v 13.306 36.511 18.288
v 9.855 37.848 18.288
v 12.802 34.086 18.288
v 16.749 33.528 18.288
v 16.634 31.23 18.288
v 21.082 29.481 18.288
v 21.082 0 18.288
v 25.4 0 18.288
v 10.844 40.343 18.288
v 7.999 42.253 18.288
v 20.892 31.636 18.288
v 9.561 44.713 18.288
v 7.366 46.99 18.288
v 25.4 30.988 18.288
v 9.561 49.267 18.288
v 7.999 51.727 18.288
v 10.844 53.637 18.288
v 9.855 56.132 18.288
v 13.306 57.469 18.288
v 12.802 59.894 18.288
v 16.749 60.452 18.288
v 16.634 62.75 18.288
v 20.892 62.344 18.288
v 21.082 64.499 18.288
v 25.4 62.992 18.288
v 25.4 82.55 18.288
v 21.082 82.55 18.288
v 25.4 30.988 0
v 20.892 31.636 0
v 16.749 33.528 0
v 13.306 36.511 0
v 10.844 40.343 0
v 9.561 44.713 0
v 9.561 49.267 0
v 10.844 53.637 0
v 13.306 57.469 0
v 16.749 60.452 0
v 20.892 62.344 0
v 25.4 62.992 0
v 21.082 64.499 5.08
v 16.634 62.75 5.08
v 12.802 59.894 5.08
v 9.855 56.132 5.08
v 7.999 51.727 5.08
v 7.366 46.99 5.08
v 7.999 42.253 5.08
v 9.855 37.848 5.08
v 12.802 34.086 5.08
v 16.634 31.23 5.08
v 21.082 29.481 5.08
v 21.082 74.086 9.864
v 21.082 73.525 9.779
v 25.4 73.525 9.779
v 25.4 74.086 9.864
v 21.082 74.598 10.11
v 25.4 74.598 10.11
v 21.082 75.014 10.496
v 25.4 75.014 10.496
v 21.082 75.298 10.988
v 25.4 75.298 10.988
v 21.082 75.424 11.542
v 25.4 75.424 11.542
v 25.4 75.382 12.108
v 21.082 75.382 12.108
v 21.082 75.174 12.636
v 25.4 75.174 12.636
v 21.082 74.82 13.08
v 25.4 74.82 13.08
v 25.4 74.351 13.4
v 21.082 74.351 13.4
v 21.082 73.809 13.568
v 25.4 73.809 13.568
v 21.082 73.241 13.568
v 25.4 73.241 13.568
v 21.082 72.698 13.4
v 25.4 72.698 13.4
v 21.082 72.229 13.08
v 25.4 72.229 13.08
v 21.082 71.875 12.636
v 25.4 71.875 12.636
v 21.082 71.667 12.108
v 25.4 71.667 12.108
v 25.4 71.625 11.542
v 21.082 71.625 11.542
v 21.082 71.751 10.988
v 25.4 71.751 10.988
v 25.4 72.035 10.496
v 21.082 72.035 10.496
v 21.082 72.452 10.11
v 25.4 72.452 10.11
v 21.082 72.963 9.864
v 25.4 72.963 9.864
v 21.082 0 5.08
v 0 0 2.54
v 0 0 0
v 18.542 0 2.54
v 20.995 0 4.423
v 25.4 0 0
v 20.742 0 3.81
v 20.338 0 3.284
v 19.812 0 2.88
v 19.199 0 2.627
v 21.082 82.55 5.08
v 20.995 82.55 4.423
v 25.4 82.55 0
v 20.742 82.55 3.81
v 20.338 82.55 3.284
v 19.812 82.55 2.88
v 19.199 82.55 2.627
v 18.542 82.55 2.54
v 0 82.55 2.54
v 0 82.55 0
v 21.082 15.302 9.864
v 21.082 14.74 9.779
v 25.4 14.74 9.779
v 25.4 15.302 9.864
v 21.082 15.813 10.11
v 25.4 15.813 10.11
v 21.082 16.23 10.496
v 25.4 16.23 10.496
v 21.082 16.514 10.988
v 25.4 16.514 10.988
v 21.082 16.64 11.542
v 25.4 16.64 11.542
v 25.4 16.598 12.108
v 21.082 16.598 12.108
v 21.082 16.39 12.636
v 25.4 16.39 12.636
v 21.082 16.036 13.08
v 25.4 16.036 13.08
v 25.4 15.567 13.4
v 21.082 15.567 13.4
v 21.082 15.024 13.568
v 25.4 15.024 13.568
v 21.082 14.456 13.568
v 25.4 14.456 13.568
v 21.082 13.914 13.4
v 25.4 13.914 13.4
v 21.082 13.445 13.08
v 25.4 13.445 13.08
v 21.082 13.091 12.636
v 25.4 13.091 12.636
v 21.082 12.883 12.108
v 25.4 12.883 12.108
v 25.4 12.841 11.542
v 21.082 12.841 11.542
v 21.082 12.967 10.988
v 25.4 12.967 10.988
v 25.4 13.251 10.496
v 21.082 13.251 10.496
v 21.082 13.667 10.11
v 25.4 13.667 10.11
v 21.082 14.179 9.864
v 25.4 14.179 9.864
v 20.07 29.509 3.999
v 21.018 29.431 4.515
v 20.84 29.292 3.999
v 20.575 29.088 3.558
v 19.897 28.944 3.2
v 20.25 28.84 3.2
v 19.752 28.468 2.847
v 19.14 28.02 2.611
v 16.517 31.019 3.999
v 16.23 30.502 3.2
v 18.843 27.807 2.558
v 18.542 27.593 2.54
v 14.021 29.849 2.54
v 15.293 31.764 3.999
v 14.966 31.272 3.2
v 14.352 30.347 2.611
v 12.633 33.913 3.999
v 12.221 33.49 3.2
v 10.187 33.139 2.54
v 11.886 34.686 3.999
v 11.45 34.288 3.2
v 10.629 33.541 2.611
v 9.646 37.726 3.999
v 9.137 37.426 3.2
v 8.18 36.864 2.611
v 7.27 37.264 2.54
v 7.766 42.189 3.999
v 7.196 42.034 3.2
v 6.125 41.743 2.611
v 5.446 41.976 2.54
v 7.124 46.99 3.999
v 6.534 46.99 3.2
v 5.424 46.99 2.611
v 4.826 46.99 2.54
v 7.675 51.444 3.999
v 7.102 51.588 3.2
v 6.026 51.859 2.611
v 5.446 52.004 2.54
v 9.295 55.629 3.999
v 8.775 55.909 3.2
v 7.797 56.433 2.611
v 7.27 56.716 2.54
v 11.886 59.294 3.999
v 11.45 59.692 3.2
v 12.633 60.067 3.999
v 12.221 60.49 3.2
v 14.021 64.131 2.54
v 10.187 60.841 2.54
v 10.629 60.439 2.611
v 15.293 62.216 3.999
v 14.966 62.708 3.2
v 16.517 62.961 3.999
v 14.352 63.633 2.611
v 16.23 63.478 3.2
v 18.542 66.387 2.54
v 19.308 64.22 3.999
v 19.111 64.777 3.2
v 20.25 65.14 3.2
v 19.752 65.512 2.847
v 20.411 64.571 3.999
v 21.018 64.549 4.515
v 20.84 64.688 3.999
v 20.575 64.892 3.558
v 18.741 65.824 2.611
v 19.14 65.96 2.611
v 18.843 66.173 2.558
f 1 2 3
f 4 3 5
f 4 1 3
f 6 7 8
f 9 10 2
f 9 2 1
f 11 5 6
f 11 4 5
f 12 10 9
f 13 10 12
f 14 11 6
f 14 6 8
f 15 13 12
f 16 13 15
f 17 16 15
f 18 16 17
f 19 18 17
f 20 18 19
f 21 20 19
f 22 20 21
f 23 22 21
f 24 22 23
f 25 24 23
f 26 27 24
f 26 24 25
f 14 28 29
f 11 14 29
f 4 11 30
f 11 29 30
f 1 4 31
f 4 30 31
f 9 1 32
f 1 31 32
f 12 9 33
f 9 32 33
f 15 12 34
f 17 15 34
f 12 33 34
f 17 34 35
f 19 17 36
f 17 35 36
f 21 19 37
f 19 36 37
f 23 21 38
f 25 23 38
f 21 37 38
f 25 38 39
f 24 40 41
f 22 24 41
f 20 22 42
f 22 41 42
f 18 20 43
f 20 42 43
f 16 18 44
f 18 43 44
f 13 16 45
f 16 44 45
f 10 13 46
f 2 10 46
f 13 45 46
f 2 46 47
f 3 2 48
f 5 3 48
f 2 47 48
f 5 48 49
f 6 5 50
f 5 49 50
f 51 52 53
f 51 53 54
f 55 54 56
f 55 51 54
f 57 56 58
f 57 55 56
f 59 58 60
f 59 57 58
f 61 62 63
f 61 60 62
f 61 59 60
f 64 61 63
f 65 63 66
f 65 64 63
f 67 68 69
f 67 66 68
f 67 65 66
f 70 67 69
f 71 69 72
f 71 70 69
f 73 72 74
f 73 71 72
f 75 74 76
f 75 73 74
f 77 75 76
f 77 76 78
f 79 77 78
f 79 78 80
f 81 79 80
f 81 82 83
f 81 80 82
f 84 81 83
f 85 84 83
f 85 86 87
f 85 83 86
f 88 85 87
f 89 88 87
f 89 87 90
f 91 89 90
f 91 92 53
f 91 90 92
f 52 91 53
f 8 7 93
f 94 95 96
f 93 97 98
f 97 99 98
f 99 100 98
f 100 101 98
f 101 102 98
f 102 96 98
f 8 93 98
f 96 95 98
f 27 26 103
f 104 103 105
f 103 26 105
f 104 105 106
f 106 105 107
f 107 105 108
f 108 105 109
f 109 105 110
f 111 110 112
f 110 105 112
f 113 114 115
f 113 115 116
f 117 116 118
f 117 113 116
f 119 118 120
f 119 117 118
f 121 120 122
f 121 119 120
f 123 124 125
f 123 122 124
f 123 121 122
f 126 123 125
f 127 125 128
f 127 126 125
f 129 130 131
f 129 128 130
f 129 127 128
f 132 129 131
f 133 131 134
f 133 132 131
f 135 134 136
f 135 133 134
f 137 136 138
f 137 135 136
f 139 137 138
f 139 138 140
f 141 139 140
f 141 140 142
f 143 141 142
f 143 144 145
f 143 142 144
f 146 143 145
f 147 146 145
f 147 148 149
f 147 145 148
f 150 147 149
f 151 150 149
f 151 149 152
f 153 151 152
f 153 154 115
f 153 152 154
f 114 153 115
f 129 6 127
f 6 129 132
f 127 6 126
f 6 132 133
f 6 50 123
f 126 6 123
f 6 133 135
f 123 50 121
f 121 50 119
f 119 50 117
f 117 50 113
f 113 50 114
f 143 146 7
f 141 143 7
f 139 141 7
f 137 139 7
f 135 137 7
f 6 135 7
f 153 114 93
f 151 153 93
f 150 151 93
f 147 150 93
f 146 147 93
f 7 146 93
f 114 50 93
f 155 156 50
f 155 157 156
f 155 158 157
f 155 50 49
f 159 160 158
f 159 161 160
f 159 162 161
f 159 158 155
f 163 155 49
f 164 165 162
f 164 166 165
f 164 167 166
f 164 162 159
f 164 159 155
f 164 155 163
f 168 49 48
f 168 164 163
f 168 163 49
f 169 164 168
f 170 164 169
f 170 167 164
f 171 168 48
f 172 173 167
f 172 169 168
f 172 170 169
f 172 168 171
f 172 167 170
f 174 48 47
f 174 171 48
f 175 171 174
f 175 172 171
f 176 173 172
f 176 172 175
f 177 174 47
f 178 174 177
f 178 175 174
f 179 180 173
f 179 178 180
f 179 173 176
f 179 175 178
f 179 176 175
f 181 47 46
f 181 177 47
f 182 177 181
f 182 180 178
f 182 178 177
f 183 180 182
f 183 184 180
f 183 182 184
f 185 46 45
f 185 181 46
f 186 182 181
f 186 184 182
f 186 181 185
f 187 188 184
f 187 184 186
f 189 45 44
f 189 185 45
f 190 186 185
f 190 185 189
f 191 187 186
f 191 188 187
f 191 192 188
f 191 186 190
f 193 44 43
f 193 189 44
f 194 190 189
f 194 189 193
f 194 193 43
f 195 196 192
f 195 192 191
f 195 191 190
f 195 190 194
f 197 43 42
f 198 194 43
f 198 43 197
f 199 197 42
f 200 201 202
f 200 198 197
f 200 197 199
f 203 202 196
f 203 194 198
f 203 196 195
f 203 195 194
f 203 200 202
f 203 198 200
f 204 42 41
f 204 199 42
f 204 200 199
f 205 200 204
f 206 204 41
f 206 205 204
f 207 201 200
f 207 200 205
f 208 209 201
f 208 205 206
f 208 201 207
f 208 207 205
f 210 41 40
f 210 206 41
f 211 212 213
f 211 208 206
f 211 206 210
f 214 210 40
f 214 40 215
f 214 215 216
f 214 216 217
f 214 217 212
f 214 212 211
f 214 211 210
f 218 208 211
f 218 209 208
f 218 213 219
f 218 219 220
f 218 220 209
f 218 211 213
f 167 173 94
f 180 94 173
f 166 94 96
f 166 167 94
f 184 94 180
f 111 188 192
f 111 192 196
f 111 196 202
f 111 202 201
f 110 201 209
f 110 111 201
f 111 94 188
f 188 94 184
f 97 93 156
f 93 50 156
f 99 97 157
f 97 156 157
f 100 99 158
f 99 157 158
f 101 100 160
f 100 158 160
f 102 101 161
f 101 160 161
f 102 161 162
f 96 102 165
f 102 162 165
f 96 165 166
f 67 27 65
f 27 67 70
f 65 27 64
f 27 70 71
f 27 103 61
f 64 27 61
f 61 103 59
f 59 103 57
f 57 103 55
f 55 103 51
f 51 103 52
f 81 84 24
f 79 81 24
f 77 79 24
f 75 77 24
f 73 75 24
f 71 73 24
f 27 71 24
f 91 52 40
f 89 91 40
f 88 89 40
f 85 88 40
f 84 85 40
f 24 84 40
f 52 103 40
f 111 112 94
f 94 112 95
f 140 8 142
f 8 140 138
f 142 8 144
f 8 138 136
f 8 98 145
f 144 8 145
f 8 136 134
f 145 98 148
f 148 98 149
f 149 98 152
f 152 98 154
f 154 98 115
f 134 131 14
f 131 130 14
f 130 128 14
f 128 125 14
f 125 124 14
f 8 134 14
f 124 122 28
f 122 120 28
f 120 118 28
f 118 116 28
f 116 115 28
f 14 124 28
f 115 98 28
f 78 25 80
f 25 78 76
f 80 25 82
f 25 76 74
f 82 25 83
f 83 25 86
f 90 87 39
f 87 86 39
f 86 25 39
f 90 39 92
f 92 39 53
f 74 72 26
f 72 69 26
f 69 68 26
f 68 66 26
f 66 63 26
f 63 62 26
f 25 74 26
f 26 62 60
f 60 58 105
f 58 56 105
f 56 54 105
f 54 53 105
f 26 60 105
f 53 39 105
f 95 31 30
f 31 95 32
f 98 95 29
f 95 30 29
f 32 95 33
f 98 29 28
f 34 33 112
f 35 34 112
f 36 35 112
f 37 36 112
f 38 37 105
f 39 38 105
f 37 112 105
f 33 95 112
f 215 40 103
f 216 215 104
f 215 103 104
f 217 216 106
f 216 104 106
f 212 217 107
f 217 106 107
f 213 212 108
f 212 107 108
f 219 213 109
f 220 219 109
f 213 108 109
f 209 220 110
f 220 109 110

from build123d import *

# Parameters (mm, degrees)
BOSS_EXTRUDE2_DEPTH     = 2.54
BOSS_EXTRUDE3_DEPTH     = 18.288
FILLET1_R               = 2.54
SKETCH4_R               = 1.905
CUT_EXTRUDE1_DEPTH      = 26.4
CUT_EXTRUDE1_DEPTH_BACK = 1


with BuildPart() as part:
    # Sketch3 → Boss-Extrude2 (new body)
    with BuildSketch(Plane.XY):
        with BuildLine():
            Line((0, 82.55), (0, 0))
            Line((0, 0), (21.082, 0))
            Line((21.082, 0), (21.082, 29.480573053))
            ThreePointArc((21.082, 29.480573053), (7.366, 46.99), (21.082, 64.499426947))
            Line((21.082, 64.499426947), (21.082, 82.55))
            Line((21.082, 82.55), (0, 82.55))
        make_face()
    extrude(amount=BOSS_EXTRUDE2_DEPTH)

    # Sketch3<5> → Boss-Extrude3 (add)
    with BuildSketch(Plane.XY):
        with BuildLine():
            Line((21.082, 29.480573053), (21.082, 0))
            Line((21.082, 0), (25.4, 0))
            Line((25.4, 0), (25.4, 30.988))
            ThreePointArc((25.4, 30.988), (9.398, 46.99), (25.4, 62.992))
            Line((25.4, 62.992), (25.4, 82.55))
            Line((25.4, 82.55), (21.082, 82.55))
            Line((21.082, 82.55), (21.082, 64.499426947))
            ThreePointArc((21.082, 64.499426947), (7.366, 46.99), (21.082, 29.480573053))
        make_face()
    extrude(amount=BOSS_EXTRUDE3_DEPTH)

    # Fillet1
    fillet1_edges = [part.edges().sort_by_distance(p)[0] for p in [
        (21.082, 73.524713473, 2.54),
        (21.082, 14.740286527, 2.54),
        (7.366, 46.99, 2.54),
    ]]
    fillet(fillet1_edges, radius=FILLET1_R)

    # Sketch4 → Cut-Extrude1 (cut, two sides)
    with BuildSketch(Plane(origin=(0, 0, 0), x_dir=(0, 0, -1), z_dir=(1, 0, 0))) as cut_extrude1_sk:
        with Locations((-11.684, 14.740286527)):
            Circle(SKETCH4_R)
        with Locations((-11.684, 73.524713473)):
            Circle(SKETCH4_R)
    extrude(amount=CUT_EXTRUDE1_DEPTH, mode=Mode.SUBTRACT)
    extrude(cut_extrude1_sk.sketch, amount=-CUT_EXTRUDE1_DEPTH_BACK, mode=Mode.SUBTRACT)


solid = part.part
